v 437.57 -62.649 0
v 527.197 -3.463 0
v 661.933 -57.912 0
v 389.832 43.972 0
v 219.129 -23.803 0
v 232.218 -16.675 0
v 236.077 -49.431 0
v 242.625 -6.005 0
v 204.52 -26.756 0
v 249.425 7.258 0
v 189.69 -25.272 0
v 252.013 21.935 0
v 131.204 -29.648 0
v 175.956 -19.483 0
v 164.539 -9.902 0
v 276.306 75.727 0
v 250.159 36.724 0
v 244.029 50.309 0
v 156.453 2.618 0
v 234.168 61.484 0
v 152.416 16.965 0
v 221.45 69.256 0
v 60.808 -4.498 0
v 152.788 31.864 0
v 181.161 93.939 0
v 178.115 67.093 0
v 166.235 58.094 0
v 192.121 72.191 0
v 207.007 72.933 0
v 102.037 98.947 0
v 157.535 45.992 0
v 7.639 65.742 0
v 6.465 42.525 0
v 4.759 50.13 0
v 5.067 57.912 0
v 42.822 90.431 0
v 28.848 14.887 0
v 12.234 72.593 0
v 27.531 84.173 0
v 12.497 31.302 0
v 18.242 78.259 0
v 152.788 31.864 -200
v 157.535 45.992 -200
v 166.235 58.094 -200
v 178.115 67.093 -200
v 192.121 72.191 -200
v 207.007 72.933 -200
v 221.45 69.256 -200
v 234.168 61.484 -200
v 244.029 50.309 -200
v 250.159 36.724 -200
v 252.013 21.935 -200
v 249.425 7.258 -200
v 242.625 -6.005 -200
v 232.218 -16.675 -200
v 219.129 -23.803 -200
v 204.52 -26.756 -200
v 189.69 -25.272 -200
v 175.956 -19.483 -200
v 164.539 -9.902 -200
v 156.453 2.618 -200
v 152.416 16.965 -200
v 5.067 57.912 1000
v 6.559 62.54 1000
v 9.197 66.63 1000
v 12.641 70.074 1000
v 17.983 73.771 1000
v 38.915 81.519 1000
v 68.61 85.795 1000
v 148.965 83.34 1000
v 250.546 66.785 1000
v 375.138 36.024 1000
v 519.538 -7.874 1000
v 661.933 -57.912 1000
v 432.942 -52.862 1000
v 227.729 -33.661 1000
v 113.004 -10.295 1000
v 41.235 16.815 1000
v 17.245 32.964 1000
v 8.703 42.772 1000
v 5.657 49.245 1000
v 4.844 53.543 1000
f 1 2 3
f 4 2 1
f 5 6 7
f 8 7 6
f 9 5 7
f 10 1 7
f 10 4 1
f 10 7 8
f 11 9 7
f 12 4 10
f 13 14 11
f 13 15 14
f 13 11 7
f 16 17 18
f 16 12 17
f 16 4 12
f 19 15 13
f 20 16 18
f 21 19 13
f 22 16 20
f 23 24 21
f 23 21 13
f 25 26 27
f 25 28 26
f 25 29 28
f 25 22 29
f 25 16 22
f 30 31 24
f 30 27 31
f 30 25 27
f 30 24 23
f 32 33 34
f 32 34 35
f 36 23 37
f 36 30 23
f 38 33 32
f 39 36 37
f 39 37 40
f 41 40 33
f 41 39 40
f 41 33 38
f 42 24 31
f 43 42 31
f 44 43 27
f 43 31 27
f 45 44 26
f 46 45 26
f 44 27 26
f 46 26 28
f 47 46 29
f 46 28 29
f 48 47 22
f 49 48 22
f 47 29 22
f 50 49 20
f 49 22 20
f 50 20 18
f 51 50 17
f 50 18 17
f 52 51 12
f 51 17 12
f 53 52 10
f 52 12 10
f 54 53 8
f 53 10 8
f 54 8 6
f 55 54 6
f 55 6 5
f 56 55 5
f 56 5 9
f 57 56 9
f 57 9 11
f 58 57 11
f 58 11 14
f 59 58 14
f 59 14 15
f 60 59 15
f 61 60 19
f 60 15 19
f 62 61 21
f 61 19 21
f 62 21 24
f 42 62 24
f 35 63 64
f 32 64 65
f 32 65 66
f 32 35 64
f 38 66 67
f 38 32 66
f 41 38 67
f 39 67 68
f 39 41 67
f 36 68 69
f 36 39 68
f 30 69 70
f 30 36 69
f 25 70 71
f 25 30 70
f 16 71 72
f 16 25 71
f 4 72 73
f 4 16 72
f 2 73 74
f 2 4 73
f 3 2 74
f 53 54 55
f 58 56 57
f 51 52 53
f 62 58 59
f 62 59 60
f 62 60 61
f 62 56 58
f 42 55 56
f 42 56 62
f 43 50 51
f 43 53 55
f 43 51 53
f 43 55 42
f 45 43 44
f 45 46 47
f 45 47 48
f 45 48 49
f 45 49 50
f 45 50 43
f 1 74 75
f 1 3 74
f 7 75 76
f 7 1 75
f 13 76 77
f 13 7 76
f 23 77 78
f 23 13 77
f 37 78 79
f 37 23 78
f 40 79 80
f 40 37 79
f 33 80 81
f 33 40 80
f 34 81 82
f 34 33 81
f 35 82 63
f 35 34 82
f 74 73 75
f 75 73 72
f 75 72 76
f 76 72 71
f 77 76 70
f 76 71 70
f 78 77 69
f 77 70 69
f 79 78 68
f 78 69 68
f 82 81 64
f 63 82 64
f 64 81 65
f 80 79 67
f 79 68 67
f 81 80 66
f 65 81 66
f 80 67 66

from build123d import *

# Parameters (mm, degrees)
SKETCH_4_R        = 50
EXTRUDE_1_DEPTH   = 200
MOVE_BODY_1_ANGLE = 10


with BuildPart() as part:
    # 放样1: read off the stored shape, not the designer's step
    # 放样1: loft between two sections, ruled curve by curve
    loft_1_from = [
        Edge.make_bspline([(666.999999998, 0, 1000), (663.799637222, -0.604724548, 1000), (656.220345397, -2.022885982, 1000), (645.979516294, -3.898542902, 1000), (635.247963028, -5.826243875, 1000), (624.819981281, -7.662584434, 1000), (614.198521539, -9.496021813, 1000), (599.972074061, -11.904629718, 1000), (582.430830371, -14.787740297, 1000), (561.135044503, -18.155812197, 1000), (539.946417674, -21.377647562, 1000), (518.671869989, -24.487157927, 1000), (497.416172992, -27.468442034, 1000), (476.123475264, -30.32944244, 1000), (454.824744619, -33.062783586, 1000), (433.50415239, -35.666455969, 1000), (412.170012578, -38.132804161, 1000), (390.818267621, -40.453999041, 1000), (369.450759947, -42.619108718, 1000), (348.066446531, -44.61511771, 1000), (326.665801057, -46.426441856, 1000), (305.24879013, -48.034169355, 1000), (283.816053008, -49.416509673, 1000), (262.368394512, -50.54750092, 1000), (240.907772126, -51.396721383, 1000), (219.436549528, -51.928303079, 1000), (201.539164161, -52.070683511, 1000), (187.221095545, -51.978850226, 1000), (176.483975584, -51.799236258, 1000), (165.749412964, -51.500531623, 1000), (155.01932189, -51.073159695, 1000), (144.295530458, -50.506856143, 1000), (133.580710906, -49.789673503, 1000), (122.878050961, -48.907360236, 1000), (112.192125096, -47.843447663, 1000), (101.527781752, -46.578273412, 1000), (90.892670861, -45.089586686, 1000), (80.294429011, -43.348017915, 1000), (69.750642268, -41.316102027, 1000), (59.27225592, -38.947539372, 1000), (50.626877349, -36.641275533, 1000), (43.777772332, -34.54819846, 1000), (38.687572512, -32.840917397, 1000), (33.65117684, -30.975832975, 1000), (28.686664939, -28.92949158, 1000), (23.813093939, -26.671460223, 1000), (19.064458401, -24.161974773, 1000), (14.487509708, -21.346794417, 1000), (10.161987345, -18.156904498, 1000), (6.218399789, -14.494122288, 1000), (2.887973837, -10.257639927, 1000), (0.554665428, -5.36560271, 1000), (-0.00056538, -1.793819625, 1000), (0, 0, 1000)], [0, 0, 0, 0, 0.015625, 0.03125, 0.046875, 0.0625, 0.078125, 0.09375, 0.125, 0.15625, 0.1875, 0.21875, 0.25, 0.28125, 0.3125, 0.34375, 0.375, 0.40625, 0.4375, 0.46875, 0.5, 0.53125, 0.5625, 0.59375, 0.625, 0.65625, 0.6875, 0.703125, 0.71875, 0.734375, 0.75, 0.765625, 0.78125, 0.796875, 0.8125, 0.828125, 0.84375, 0.859375, 0.875, 0.890625, 0.90625, 0.9140625, 0.921875, 0.9296875, 0.9375, 0.9453125, 0.953125, 0.9609375, 0.96875, 0.9765625, 0.984375, 0.9921875, 1, 1, 1, 1], 3),
        Edge.make_bspline([(0, 0, 1000), (-0.00056538, 1.793819625, 1000), (0.554665457, 5.365602719, 1000), (2.887973782, 10.257639911, 1000), (6.218399893, 14.494122319, 1000), (10.16198715, 18.156904441, 1000), (14.487510113, 21.346794535, 1000), (19.064457581, 24.161974532, 1000), (23.813095456, 26.671460667, 1000), (28.686661745, 28.929490645, 1000), (33.651182789, 30.975834716, 1000), (38.687562847, 32.840914568, 1000), (43.77777737, 34.548199936, 1000), (50.627004326, 36.641312682, 1000), (59.272176198, 38.947516048, 1000), (69.75068889, 41.316115667, 1000), (80.294402937, 43.348010287, 1000), (90.892684893, 45.089590791, 1000), (101.527774389, 46.578271259, 1000), (112.192129243, 47.843448873, 1000), (122.878048588, 48.907359547, 1000), (133.580712133, 49.789673852, 1000), (144.295529784, 50.506855964, 1000), (155.019322303, 51.073159781, 1000), (165.7494126, 51.500531586, 1000), (176.483976098, 51.799236258, 1000), (187.221094044, 51.978850255, 1000), (201.539174789, 52.070683467, 1000), (219.436542978, 51.928303134, 1000), (240.907775179, 51.396721346, 1000), (262.368393037, 50.54750093, 1000), (283.816053471, 49.416509703, 1000), (305.248790507, 48.034169261, 1000), (326.665799717, 46.426442055, 1000), (348.066449966, 44.615117246, 1000), (369.450753442, 42.619109596, 1000), (390.818280118, 40.453997321, 1000), (412.169989323, 38.132807449, 1000), (433.504199323, 35.666449175, 1000), (454.824640648, 33.062798963, 1000), (476.123661756, 30.329414262, 1000), (497.415809346, 27.468498036, 1000), (518.672557556, 24.487049873, 1000), (539.945247415, 21.377835197, 1000), (561.137421083, 18.155424744, 1000), (582.426549093, 14.788450701, 1000), (599.977986088, 11.903627109, 1000), (614.193135953, 9.496953161, 1000), (624.809385208, 7.66440837, 1000), (635.248408041, 5.826192456, 1000), (645.979996559, 3.898441222, 1000), (656.220005166, 2.022955598, 1000), (663.799637221, 0.604724548, 1000), (666.999999998, 0, 1000)], [0, 0, 0, 0, 0.0078125, 0.015625, 0.0234375, 0.03125, 0.0390625, 0.046875, 0.0546875, 0.0625, 0.0703125, 0.078125, 0.0859375, 0.09375, 0.109375, 0.125, 0.140625, 0.15625, 0.171875, 0.1875, 0.203125, 0.21875, 0.234375, 0.25, 0.265625, 0.28125, 0.296875, 0.3125, 0.34375, 0.375, 0.40625, 0.4375, 0.46875, 0.5, 0.53125, 0.5625, 0.59375, 0.625, 0.65625, 0.6875, 0.71875, 0.75, 0.78125, 0.8125, 0.84375, 0.875, 0.90625, 0.921875, 0.9375, 0.953125, 0.96875, 0.984375, 1, 1, 1, 1], 3),
    ]
    loft_1_to = [
        Edge.make_bspline([(667, 0, 0), (663.787937121, -0.778122232, 0), (656.200450193, -2.598380354, 0), (645.874703604, -5.022316958, 0), (635.152751042, -7.491793756, 0), (624.5656651, -9.880168768, 0), (613.932901468, -12.233182769, 0), (599.674290652, -15.325646654, 0), (581.992397773, -19.049903866, 0), (560.57943939, -23.387245223, 0), (539.221710022, -27.546205859, 0), (517.787201902, -31.556421716, 0), (496.348785222, -35.404191447, 0), (474.869299834, -39.09532252, 0), (453.369610223, -42.622057623, 0), (431.838824667, -45.980159867, 0), (410.283069511, -49.159666954, 0), (388.699054607, -52.149437047, 0), (367.088216437, -54.934513775, 0), (345.449452769, -57.497118306, 0), (323.783329406, -59.815457029, 0), (302.089797679, -61.863709181, 0), (280.370013167, -63.611758836, 0), (258.625333152, -65.023318773, 0), (236.859716284, -66.056526685, 0), (215.07684211, -66.660710105, 0), (196.918876775, -66.757547051, 0), (182.392533714, -66.55498137, 0), (171.501404926, -66.251902277, 0), (160.617518552, -65.786531136, 0), (149.742132912, -65.14508538, 0), (138.876506323, -64.313782442, 0), (128.032113187, -63.275126167, 0), (117.209580934, -62.009887151, 0), (106.420382287, -60.495066539, 0), (95.672322051, -58.704678377, 0), (84.980781239, -56.605895334, 0), (74.36207887, -54.160061058, 0), (63.842374932, -51.318325944, 0), (53.456401835, -48.016417607, 0), (44.957838639, -44.813840559, 0), (38.292062891, -41.923609068, 0), (33.377232896, -39.572370085, 0), (28.56486913, -37.018085304, 0), (23.883463681, -34.231740425, 0), (19.36150864, -31.18432115, 0), (15.060271723, -27.837579504, 0), (11.041020644, -24.153267514, 0), (7.406069775, -20.084935176, 0), (4.290999374, -15.600598491, 0), (1.871979479, -10.701125876, 0), (0.340748863, -5.445801038, 0), (-0.000762063, -1.818923188, 0), (0, 0, 0)], [0, 0, 0, 0, 0.015625, 0.03125, 0.046875, 0.0625, 0.078125, 0.09375, 0.125, 0.15625, 0.1875, 0.21875, 0.25, 0.28125, 0.3125, 0.34375, 0.375, 0.40625, 0.4375, 0.46875, 0.5, 0.53125, 0.5625, 0.59375, 0.625, 0.65625, 0.6875, 0.703125, 0.71875, 0.734375, 0.75, 0.765625, 0.78125, 0.796875, 0.8125, 0.828125, 0.84375, 0.859375, 0.875, 0.890625, 0.90625, 0.9140625, 0.921875, 0.9296875, 0.9375, 0.9453125, 0.953125, 0.9609375, 0.96875, 0.9765625, 0.984375, 0.9921875, 1, 1, 1, 1], 3),
        Edge.make_bspline([(0, 0, 0), (-0.000762063, 1.818923188, 0), (0.340748548, 5.445800771, 0), (1.871980086, 10.701126391, 0), (4.290998372, 15.600597641, 0), (7.406071183, 20.084936371, 0), (11.041021844, 24.15326852, 0), (15.060236322, 27.837549592, 0), (19.361493058, 31.184307985, 0), (23.883478049, 34.231752566, 0), (28.564877292, 37.018092199, 0), (33.377225985, 39.572364244, 0), (38.292059332, 41.923606062, 0), (44.957845322, 44.81384621, 0), (53.456396907, 48.016413426, 0), (63.842377593, 51.318328228, 0), (74.36207734, 54.160059689, 0), (84.980781846, 56.605896032, 0), (95.6723223, 58.704678198, 0), (106.420381084, 60.495066274, 0), (117.209583402, 62.009887926, 0), (128.03211035, 63.275124839, 0), (138.876497485, 64.313783504, 0), (149.742260365, 65.145092619, 0), (160.617583681, 65.786535028, 0), (171.501366862, 66.251900805, 0), (182.392509333, 66.554980024, 0), (196.91891222, 66.75754823, 0), (215.076816077, 66.660709555, 0), (236.859730532, 66.056526855, 0), (258.625324823, 65.023318727, 0), (280.370017887, 63.611758862, 0), (302.089795835, 61.863709105, 0), (323.783329573, 59.815457216, 0), (345.449454995, 57.497117841, 0), (367.088211422, 54.934514671, 0), (388.699064902, 52.149435238, 0), (410.283049885, 49.15967045, 0), (431.83886648, 45.980152247, 0), (453.369533879, 42.622071814, 0), (474.869445862, 39.095294769, 0), (496.348540372, 35.404238832, 0), (517.787684284, 31.556326568, 0), (539.220784537, 27.546391723, 0), (560.581135329, 23.386898456, 0), (581.988814982, 19.050650465, 0), (599.680611516, 15.324311348, 0), (613.932935101, 12.233157769, 0), (624.565379788, 9.880240812, 0), (635.152932724, 7.491748581, 0), (645.874603859, 5.02234186, 0), (656.200501376, 2.598367496, 0), (663.787937121, 0.778122232, 0), (667, 0, 0)], [0, 0, 0, 0, 0.0078125, 0.015625, 0.0234375, 0.03125, 0.0390625, 0.046875, 0.0546875, 0.0625, 0.0703125, 0.078125, 0.0859375, 0.09375, 0.109375, 0.125, 0.140625, 0.15625, 0.171875, 0.1875, 0.203125, 0.21875, 0.234375, 0.25, 0.265625, 0.28125, 0.296875, 0.3125, 0.34375, 0.375, 0.40625, 0.4375, 0.46875, 0.5, 0.53125, 0.5625, 0.59375, 0.625, 0.65625, 0.6875, 0.71875, 0.75, 0.78125, 0.8125, 0.84375, 0.875, 0.90625, 0.921875, 0.9375, 0.953125, 0.96875, 0.984375, 1, 1, 1, 1], 3),
    ]
    loft_1 = Solid(Shell([*[Face.make_surface_from_curves(loft_1_from[k], loft_1_to[k]) for k in range(2)], Face(Wire(loft_1_from)), Face(Wire(loft_1_to))]))
    add(loft_1)

    # 草图4 → 凸台-拉伸1 (add)
    with BuildSketch(Plane(origin=(0, 0, 0), x_dir=(-1, 0, 0), z_dir=(0, 0, -1))):
        with Locations((-200, 0)):
            Circle(SKETCH_4_R)
    extrude(amount=EXTRUDE_1_DEPTH)


with BuildPart() as part_1:
    # Move Body 1: moved
    add(part.part.rotate(Axis((333.49958875, 7.784e-06, 0), (0, 0, -1)), MOVE_BODY_1_ANGLE))


solid = part_1.part
